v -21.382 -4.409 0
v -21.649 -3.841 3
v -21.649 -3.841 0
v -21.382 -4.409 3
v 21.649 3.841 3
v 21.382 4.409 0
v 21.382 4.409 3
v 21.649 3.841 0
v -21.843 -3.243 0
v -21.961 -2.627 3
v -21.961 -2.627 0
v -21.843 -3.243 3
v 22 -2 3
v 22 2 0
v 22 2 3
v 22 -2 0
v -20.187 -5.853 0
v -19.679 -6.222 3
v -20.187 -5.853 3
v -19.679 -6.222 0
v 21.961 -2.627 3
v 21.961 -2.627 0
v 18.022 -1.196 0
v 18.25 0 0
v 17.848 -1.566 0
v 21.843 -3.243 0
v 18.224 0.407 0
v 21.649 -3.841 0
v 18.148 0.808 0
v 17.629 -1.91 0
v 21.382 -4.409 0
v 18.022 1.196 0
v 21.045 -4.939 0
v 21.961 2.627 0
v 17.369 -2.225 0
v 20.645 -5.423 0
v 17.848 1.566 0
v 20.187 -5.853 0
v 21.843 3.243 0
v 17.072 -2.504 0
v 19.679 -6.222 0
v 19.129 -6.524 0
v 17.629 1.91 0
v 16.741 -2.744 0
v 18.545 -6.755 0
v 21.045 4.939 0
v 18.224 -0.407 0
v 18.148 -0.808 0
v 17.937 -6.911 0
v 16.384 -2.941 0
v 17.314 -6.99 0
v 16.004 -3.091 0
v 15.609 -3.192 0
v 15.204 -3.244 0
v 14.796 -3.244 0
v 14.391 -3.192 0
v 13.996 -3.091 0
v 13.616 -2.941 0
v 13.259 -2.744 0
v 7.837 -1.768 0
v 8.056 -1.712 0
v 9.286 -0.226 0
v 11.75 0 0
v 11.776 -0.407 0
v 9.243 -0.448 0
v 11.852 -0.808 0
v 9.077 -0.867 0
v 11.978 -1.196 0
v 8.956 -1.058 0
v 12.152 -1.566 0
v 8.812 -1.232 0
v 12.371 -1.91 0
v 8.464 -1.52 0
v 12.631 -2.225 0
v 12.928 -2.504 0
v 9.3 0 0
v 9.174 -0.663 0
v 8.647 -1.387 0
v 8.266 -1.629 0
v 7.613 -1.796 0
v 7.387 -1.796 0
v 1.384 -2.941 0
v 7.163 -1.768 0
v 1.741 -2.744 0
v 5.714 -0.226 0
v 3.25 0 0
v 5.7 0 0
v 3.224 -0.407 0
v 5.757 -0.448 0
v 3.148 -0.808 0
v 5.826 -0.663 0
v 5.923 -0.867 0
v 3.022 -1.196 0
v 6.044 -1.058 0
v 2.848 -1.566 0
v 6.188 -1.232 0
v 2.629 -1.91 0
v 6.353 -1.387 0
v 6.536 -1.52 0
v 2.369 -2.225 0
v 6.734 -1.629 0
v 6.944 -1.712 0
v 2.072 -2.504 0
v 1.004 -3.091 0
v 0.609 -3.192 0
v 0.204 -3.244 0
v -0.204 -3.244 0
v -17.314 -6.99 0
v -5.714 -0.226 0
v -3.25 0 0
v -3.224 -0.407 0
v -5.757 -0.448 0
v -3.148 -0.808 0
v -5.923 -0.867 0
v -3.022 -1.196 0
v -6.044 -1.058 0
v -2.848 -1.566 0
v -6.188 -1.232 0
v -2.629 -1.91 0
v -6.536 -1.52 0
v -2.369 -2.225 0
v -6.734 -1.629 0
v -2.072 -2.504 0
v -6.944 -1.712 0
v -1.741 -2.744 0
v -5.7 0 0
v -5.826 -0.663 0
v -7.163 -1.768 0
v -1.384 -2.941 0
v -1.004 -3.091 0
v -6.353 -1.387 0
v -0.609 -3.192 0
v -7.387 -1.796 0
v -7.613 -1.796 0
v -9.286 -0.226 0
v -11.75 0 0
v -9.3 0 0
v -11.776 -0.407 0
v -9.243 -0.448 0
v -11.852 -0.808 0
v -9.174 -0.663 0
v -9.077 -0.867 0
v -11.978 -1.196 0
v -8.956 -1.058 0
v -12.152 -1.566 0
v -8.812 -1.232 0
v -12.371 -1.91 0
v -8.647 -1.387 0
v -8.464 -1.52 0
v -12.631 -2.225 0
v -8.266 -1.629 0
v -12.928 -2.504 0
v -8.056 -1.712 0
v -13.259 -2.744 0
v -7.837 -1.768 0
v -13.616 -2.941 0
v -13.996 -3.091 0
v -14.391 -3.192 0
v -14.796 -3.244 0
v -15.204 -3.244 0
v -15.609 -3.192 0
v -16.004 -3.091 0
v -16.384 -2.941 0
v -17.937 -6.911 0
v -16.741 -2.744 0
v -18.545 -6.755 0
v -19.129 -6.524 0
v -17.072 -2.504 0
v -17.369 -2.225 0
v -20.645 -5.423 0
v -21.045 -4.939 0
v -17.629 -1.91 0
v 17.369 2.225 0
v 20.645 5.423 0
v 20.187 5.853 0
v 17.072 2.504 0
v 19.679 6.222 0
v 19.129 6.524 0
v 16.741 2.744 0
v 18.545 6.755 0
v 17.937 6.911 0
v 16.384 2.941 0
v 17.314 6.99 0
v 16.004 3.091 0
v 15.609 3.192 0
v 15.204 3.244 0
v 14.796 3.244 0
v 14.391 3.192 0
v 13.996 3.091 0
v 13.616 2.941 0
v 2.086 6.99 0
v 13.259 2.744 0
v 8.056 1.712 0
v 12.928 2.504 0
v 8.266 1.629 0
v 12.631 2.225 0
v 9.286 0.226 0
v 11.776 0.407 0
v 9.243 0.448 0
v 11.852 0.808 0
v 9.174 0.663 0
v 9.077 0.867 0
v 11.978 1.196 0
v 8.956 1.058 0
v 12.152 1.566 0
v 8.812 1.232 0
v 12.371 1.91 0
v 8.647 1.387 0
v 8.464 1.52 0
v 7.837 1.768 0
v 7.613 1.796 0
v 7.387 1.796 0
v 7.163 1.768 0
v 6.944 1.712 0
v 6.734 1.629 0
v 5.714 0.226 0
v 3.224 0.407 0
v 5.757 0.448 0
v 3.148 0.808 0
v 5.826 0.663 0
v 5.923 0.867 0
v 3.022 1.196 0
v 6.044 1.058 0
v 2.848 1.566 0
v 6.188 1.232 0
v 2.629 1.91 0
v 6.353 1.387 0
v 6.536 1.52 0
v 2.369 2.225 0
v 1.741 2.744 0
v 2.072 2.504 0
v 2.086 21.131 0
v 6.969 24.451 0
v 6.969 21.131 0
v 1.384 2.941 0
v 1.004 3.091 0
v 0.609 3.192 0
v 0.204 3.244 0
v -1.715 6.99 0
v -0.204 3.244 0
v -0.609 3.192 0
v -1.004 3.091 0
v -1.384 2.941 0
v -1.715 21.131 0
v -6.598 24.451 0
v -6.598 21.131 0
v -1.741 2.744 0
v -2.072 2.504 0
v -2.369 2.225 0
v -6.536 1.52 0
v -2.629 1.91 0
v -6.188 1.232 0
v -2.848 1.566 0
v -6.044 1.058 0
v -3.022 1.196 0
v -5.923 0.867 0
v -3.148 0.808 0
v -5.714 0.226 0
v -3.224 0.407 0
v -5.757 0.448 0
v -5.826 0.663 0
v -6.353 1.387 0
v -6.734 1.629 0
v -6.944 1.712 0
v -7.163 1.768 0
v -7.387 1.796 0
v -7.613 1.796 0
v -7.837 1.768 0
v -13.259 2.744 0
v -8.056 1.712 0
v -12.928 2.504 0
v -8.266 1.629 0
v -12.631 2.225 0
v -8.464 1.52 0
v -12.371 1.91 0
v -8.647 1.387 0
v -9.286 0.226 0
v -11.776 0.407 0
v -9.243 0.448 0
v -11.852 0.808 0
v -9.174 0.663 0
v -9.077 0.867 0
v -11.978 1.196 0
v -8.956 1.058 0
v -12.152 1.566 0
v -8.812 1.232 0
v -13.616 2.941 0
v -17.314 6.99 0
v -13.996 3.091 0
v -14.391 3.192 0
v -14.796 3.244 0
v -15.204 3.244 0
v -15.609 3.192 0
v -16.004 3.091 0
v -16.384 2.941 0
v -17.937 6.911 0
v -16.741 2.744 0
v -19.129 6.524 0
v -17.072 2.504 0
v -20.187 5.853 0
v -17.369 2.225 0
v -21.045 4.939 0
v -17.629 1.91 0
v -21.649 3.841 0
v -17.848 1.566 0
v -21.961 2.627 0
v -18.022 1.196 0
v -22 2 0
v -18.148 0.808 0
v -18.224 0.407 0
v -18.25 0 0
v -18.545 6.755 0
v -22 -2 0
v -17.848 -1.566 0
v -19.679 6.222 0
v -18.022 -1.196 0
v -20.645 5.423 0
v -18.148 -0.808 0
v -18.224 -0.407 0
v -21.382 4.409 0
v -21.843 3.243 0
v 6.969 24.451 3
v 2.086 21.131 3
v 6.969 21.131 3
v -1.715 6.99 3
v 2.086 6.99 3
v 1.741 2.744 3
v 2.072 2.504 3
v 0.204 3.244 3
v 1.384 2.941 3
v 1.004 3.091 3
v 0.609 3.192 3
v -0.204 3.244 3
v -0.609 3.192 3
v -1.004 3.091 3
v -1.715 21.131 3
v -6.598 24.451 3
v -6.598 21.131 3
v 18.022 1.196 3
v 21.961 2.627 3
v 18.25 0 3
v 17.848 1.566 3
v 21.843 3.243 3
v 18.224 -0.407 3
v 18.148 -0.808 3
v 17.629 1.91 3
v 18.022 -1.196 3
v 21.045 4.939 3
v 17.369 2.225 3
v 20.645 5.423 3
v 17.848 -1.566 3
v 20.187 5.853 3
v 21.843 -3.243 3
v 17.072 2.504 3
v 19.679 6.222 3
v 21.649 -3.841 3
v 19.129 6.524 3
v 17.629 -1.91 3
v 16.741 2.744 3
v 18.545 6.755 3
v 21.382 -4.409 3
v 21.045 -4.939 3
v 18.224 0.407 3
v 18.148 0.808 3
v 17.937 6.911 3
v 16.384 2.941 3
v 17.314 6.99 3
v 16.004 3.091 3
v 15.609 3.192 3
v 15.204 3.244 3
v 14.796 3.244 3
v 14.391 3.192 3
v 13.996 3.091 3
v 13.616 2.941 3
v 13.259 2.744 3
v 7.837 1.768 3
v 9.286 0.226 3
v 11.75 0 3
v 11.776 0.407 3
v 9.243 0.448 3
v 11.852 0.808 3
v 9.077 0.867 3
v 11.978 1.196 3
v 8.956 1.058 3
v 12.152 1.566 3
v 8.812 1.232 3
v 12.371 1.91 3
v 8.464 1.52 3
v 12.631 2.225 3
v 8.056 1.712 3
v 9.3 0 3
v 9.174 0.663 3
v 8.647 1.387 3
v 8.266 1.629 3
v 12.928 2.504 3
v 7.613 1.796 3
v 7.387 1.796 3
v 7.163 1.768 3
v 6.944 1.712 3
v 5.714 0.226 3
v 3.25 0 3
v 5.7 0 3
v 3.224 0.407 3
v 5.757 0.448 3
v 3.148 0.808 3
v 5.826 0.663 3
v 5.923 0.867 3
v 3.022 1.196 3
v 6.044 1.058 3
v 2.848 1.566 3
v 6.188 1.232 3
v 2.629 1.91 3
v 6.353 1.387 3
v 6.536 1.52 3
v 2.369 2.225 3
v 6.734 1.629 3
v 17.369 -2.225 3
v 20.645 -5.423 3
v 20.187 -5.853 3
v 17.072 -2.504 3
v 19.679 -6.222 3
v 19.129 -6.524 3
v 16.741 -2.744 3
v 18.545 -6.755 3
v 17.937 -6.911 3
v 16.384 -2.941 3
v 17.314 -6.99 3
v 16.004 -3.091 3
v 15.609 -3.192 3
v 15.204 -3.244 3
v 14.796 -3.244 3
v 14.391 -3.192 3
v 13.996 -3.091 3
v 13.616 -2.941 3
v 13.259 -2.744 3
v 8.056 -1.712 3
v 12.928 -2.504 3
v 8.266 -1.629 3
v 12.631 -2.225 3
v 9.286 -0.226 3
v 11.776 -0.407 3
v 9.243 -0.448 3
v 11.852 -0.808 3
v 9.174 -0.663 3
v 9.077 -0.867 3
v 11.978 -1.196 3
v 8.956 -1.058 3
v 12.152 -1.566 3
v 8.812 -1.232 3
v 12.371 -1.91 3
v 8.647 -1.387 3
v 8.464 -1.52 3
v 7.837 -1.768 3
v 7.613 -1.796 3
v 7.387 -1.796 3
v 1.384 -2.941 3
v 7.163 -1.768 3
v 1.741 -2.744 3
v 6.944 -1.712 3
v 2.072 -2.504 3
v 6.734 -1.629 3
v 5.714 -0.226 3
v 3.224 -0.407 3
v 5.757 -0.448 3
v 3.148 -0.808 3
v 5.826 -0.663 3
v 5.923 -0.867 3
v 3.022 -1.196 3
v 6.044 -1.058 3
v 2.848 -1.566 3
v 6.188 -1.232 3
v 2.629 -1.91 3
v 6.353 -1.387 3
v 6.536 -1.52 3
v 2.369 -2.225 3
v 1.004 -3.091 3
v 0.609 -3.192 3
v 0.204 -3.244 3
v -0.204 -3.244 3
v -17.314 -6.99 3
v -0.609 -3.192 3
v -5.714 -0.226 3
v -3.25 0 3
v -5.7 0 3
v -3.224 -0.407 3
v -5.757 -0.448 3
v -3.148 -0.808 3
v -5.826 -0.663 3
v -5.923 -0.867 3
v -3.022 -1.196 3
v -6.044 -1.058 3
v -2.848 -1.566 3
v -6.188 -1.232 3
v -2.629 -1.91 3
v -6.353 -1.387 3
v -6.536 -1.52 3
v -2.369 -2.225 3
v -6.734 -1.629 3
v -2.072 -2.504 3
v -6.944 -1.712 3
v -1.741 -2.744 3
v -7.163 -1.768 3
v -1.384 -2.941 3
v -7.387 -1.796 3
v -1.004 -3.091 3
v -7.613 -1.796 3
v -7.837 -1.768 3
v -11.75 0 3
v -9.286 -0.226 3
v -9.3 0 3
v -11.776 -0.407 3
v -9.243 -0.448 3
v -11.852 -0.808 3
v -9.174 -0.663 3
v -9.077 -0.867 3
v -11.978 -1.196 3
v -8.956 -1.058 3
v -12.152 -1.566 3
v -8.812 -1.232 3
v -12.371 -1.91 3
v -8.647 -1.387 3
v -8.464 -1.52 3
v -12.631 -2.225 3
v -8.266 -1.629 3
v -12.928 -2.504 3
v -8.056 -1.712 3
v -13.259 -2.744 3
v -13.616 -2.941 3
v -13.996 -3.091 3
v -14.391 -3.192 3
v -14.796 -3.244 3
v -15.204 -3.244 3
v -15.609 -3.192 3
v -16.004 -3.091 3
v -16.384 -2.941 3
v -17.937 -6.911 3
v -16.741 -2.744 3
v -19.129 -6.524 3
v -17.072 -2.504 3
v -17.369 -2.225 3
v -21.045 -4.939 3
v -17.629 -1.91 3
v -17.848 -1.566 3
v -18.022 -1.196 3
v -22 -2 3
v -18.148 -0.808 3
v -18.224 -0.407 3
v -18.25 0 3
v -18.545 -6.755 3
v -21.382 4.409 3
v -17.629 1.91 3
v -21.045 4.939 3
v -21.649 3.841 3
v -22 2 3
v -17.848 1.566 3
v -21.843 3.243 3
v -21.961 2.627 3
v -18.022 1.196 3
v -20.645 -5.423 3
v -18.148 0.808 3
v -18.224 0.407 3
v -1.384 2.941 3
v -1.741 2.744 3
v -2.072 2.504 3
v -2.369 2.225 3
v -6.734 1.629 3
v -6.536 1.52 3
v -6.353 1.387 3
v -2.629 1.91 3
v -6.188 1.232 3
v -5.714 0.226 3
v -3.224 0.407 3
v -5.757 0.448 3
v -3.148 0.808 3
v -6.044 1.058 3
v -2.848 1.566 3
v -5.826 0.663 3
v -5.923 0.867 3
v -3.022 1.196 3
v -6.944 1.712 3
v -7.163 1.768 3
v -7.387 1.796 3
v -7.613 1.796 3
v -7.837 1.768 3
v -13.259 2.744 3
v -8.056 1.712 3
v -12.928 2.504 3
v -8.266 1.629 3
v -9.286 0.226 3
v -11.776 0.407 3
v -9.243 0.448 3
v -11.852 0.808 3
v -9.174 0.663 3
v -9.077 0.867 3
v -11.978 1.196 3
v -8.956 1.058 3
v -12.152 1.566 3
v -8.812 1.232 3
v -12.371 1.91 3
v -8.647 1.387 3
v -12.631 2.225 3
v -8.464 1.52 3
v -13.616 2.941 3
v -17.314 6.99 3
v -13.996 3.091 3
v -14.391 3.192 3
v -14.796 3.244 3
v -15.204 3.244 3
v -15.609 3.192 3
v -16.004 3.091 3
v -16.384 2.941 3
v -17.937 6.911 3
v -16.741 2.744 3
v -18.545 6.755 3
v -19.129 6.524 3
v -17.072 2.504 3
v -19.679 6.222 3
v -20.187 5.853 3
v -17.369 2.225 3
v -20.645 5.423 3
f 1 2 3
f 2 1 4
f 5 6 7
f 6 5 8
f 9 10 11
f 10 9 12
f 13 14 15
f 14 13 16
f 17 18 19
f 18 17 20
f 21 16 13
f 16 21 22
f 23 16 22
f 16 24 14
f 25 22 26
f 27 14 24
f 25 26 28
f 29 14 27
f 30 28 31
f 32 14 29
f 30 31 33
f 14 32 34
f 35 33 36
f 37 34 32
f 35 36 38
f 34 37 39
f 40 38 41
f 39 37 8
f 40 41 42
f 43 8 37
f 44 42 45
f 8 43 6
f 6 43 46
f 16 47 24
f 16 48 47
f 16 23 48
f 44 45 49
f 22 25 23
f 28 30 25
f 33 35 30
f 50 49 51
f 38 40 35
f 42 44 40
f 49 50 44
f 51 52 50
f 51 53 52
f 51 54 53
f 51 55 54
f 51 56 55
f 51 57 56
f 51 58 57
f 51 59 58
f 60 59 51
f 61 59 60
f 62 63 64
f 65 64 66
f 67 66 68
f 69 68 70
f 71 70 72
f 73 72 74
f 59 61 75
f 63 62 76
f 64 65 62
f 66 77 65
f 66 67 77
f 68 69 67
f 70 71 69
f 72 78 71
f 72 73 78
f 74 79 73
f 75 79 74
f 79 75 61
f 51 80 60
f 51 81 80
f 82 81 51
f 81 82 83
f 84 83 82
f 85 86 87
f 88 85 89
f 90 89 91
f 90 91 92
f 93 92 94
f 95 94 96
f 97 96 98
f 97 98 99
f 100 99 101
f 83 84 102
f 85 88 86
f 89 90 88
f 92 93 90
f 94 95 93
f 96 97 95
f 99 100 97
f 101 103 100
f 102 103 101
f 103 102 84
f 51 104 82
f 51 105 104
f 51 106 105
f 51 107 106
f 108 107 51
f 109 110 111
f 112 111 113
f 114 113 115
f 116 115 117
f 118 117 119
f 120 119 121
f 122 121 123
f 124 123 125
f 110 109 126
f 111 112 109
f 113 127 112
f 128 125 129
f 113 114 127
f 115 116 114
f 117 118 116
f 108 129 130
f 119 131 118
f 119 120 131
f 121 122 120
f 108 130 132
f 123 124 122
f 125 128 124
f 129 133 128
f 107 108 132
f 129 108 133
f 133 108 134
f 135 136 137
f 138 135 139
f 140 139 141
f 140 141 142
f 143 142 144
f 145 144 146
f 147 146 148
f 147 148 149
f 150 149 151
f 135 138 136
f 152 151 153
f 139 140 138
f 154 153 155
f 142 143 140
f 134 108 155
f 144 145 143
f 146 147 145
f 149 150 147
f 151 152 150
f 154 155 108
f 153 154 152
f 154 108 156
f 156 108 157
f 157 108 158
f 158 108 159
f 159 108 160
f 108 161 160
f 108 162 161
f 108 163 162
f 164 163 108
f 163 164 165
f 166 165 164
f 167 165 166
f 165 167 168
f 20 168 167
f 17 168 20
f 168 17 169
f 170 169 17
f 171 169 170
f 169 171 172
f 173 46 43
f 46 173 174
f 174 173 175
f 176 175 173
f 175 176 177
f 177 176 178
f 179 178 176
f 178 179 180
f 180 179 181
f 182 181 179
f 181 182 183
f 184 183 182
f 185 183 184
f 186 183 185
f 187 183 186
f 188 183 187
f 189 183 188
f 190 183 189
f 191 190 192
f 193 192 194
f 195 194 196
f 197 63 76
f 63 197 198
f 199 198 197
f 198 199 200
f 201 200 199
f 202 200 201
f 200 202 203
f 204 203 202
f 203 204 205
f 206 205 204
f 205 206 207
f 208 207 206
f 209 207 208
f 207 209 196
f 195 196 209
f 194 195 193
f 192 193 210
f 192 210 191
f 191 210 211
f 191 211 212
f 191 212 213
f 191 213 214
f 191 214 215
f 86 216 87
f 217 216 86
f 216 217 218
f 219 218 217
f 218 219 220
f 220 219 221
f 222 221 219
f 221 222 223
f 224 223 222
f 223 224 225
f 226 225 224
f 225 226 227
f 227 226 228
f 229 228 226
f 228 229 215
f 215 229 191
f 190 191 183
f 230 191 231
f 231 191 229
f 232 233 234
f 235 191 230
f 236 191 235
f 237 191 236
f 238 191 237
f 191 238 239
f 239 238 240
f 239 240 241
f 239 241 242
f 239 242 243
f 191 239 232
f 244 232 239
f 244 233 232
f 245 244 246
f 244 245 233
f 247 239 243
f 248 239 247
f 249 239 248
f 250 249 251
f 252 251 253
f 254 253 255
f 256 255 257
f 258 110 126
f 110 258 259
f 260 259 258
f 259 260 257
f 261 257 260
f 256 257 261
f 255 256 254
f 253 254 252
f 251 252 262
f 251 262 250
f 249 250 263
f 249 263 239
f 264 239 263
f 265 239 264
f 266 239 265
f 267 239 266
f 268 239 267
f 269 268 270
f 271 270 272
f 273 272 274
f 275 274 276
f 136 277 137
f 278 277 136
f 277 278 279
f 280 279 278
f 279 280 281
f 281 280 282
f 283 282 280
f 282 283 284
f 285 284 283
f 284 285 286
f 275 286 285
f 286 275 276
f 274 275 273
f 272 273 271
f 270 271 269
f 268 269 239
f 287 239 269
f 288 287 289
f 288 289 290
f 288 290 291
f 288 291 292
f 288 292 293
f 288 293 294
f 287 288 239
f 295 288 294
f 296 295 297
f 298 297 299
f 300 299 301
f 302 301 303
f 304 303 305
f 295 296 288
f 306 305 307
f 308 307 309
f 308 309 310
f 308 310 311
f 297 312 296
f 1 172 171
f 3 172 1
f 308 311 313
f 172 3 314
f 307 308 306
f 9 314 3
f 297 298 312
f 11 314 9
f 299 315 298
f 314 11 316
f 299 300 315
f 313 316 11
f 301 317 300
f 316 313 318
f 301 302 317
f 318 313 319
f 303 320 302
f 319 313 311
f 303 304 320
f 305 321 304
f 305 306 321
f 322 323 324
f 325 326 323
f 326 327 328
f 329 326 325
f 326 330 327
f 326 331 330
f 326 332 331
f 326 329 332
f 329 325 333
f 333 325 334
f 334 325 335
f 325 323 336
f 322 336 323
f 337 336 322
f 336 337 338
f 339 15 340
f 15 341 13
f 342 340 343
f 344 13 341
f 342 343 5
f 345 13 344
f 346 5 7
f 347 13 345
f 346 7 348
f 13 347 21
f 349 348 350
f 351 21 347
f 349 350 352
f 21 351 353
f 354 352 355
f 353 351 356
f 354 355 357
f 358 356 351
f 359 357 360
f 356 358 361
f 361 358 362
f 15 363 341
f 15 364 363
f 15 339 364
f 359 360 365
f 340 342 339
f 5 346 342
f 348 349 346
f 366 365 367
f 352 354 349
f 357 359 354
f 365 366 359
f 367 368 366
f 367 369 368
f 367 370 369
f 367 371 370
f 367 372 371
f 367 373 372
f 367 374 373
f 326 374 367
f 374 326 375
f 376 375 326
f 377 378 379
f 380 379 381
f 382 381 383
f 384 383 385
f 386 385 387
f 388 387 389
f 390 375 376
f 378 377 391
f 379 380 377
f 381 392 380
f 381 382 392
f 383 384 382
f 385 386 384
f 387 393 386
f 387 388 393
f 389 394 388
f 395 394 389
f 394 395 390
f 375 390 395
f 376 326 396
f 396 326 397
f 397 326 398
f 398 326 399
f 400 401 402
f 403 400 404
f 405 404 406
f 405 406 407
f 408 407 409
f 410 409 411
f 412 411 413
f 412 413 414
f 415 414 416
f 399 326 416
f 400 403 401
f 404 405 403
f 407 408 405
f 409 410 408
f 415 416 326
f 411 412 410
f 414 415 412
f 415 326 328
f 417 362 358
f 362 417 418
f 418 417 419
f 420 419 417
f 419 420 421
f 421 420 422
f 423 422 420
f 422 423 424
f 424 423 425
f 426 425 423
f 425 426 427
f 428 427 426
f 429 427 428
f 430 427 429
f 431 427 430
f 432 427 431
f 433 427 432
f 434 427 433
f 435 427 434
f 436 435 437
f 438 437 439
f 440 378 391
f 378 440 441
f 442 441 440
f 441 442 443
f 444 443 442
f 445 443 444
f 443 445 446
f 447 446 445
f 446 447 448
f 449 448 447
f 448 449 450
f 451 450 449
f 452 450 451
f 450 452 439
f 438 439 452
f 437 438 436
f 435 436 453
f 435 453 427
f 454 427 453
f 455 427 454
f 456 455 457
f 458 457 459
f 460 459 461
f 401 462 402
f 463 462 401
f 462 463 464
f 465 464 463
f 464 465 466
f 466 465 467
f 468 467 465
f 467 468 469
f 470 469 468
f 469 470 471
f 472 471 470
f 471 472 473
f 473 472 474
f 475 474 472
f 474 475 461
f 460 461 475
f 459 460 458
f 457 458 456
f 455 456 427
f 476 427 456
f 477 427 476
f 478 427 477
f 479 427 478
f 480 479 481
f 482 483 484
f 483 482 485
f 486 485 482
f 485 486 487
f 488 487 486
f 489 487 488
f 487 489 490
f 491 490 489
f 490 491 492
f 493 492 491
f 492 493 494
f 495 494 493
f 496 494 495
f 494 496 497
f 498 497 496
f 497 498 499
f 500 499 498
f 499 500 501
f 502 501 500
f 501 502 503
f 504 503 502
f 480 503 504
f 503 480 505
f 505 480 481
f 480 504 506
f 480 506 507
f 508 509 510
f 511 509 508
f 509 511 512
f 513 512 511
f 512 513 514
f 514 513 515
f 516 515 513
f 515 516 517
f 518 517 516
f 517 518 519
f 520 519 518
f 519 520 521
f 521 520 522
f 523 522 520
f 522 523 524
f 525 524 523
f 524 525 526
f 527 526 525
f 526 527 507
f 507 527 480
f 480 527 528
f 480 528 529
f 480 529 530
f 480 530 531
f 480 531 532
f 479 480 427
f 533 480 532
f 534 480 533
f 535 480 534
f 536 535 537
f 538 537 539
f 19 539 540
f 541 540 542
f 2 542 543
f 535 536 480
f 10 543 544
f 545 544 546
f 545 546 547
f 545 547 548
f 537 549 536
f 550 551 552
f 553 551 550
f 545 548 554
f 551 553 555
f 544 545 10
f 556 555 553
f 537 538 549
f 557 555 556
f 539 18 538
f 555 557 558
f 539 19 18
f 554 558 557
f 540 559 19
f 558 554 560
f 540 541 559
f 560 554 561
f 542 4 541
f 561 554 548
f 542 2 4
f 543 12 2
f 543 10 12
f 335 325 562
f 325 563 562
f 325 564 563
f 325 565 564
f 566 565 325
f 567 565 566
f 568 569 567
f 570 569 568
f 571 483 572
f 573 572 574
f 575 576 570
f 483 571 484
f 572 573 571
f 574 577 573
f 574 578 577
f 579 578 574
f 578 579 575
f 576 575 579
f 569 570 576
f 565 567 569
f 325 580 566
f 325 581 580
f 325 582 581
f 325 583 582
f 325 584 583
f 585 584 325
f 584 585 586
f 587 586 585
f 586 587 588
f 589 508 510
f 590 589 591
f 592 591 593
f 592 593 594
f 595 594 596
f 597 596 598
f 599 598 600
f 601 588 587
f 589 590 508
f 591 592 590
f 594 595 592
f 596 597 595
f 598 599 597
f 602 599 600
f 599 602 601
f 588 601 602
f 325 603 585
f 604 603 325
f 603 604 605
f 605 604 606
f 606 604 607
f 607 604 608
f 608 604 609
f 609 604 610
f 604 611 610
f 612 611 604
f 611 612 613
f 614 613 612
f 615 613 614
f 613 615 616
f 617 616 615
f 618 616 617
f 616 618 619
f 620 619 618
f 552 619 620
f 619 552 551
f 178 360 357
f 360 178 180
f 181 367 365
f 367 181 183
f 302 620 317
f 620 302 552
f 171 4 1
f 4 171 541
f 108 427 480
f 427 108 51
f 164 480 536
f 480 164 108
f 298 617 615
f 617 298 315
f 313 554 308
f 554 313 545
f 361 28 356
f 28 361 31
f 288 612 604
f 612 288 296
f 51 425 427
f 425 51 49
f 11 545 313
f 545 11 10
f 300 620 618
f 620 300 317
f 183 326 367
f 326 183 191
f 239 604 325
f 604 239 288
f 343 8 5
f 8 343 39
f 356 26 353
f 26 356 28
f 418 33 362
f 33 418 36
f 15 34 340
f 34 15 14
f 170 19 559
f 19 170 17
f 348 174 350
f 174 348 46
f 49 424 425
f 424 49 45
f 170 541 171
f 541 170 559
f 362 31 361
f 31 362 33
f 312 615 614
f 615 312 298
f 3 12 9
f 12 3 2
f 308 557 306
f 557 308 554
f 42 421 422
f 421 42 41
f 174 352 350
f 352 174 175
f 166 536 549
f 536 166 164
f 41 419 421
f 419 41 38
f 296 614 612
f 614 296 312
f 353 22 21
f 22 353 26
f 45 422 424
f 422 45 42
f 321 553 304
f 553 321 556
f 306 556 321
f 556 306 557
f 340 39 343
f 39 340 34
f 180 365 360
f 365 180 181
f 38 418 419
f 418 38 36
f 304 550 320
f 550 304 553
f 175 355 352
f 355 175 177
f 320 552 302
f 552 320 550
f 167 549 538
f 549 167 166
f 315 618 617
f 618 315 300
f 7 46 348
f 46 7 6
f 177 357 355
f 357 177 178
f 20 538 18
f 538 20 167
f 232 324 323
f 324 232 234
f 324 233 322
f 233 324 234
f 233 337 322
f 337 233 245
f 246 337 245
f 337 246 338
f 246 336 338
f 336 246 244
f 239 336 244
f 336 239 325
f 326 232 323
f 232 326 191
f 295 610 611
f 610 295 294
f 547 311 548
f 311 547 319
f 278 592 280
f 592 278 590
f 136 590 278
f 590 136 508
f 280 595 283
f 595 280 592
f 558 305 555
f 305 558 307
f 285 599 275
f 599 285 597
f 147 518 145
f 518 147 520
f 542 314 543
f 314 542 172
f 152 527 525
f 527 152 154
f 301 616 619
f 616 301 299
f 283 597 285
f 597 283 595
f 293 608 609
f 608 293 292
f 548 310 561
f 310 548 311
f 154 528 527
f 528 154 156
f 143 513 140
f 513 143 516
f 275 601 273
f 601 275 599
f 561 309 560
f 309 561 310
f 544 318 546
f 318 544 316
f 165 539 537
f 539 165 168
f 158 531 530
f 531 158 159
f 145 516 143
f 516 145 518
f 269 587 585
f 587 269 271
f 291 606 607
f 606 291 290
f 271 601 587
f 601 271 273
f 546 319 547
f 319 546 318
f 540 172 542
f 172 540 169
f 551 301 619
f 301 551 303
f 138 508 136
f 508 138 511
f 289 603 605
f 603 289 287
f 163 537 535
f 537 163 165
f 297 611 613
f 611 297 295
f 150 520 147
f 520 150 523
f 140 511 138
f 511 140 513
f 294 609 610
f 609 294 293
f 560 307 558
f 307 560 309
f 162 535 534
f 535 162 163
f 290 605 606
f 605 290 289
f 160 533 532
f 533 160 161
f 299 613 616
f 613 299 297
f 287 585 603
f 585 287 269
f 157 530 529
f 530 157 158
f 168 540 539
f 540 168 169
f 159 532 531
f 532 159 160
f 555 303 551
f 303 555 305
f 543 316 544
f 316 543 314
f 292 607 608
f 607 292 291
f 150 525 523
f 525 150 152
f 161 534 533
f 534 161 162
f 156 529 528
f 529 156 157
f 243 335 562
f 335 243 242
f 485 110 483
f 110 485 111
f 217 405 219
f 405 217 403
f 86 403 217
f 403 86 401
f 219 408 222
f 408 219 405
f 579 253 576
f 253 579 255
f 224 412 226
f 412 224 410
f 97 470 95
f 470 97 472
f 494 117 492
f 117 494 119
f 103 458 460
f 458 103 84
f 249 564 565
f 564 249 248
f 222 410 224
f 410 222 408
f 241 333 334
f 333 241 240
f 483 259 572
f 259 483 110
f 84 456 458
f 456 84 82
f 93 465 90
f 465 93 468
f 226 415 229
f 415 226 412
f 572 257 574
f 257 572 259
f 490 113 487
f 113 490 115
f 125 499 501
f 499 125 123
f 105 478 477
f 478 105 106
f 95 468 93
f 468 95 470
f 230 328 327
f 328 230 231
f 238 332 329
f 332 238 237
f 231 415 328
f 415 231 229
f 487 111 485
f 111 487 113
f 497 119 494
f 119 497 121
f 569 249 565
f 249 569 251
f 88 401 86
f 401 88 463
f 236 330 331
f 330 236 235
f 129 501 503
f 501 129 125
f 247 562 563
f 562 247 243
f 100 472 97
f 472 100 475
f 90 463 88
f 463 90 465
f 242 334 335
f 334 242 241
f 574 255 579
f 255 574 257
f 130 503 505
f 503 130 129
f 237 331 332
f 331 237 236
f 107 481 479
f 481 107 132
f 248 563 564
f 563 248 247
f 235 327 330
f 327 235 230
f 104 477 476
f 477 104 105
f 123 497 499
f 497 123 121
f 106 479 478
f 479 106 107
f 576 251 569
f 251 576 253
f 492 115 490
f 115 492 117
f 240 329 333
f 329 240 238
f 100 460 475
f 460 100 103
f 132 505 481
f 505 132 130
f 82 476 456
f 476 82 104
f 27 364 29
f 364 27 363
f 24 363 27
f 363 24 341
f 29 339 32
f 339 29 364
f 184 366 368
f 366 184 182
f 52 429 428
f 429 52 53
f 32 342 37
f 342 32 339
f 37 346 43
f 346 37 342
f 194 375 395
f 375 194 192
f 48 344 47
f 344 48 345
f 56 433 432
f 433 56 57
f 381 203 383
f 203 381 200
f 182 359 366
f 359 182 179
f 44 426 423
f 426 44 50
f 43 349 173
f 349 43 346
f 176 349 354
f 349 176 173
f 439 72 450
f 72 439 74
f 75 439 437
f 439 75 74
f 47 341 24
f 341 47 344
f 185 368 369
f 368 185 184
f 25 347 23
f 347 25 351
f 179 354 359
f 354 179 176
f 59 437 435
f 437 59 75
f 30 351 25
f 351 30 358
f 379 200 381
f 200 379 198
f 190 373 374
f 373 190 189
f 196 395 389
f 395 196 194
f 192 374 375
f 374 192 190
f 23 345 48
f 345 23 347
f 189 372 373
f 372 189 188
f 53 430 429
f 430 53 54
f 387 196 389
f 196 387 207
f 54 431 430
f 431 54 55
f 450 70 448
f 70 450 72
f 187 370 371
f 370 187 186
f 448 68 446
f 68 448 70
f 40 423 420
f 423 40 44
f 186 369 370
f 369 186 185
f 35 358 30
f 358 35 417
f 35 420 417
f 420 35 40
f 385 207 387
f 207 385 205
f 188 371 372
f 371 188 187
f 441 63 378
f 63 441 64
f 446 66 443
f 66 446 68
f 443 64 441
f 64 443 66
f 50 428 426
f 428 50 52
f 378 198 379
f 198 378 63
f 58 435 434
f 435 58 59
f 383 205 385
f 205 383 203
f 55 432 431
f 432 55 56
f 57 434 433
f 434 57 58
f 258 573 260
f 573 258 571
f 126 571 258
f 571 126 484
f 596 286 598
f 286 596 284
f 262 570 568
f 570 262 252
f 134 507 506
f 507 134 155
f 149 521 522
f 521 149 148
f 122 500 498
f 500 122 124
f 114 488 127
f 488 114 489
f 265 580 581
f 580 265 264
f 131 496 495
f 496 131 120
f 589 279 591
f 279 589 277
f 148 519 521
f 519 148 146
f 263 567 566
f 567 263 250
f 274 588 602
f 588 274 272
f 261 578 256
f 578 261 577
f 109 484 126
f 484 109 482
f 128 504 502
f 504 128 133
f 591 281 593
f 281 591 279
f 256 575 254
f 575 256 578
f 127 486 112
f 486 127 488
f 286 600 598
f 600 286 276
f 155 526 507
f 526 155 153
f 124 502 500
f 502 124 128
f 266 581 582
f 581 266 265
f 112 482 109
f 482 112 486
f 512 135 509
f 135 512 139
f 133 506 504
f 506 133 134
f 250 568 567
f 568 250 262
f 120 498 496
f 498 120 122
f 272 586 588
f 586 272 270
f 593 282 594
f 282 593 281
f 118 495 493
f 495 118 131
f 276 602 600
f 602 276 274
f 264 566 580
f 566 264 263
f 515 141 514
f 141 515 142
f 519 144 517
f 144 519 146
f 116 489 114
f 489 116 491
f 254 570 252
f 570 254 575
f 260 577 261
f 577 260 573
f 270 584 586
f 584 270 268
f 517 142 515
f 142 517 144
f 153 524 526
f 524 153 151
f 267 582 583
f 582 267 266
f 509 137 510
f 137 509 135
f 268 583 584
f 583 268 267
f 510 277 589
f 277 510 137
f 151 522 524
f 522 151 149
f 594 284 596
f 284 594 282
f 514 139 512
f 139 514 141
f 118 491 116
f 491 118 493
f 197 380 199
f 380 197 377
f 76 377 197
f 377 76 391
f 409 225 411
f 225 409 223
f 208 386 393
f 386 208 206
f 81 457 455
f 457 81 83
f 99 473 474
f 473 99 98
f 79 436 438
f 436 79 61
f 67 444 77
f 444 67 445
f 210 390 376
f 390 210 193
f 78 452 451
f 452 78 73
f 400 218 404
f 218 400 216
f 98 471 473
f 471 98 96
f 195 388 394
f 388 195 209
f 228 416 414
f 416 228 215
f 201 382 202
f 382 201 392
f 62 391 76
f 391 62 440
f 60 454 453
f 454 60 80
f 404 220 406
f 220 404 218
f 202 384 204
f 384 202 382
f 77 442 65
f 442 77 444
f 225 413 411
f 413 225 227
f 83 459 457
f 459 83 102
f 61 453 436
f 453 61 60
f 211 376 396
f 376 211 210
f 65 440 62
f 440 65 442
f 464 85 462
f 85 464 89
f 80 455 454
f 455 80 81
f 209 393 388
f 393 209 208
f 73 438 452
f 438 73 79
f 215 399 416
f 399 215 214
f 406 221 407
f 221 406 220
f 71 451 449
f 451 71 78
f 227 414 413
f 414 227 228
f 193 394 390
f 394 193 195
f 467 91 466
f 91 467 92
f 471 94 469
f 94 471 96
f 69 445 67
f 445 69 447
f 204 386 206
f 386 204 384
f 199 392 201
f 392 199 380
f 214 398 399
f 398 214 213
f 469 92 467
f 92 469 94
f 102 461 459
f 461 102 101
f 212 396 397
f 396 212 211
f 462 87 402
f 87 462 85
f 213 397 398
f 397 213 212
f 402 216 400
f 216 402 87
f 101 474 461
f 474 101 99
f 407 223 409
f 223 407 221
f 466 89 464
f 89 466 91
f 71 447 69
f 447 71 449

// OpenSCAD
$fn = 50;


difference() {
	union() {
		hull() {
			translate(v = [-17.0000000000, 2.0000000000, 0]) {
				cylinder(h = 3, r = 5);
			}
			translate(v = [17.0000000000, 2.0000000000, 0]) {
				cylinder(h = 3, r = 5);
			}
			translate(v = [-17.0000000000, -2.0000000000, 0]) {
				cylinder(h = 3, r = 5);
			}
			translate(v = [17.0000000000, -2.0000000000, 0]) {
				cylinder(h = 3, r = 5);
			}
		}
		translate(v = [0, 24, 0]) {
			linear_extrude(height = 3) {
				text(font = "DejaVu Sans Mono:style=Bold", halign = "center", size = 19.0000000000, text = "T", valign = "top");
			}
		}
	}
	union() {
		translate(v = [-15.0000000000, 0.0000000000, 0]) {
			translate(v = [0, 0, -100]) {
				cylinder(h = 200, r = 3.2500000000);
			}
		}
		translate(v = [0, 0, -100]) {
			cylinder(h = 200, r = 3.2500000000);
		}
		translate(v = [15.0000000000, 0.0000000000, 0]) {
			translate(v = [0, 0, -100]) {
				cylinder(h = 200, r = 3.2500000000);
			}
		}
		translate(v = [-15.0000000000, 0.0000000000, 0]) {
			translate(v = [0, 0, -100]) {
				cylinder(h = 200, r = 1.8000000000);
			}
		}
		translate(v = [-7.5000000000, 0.0000000000, 0]) {
			translate(v = [0, 0, -100]) {
				cylinder(h = 200, r = 1.8000000000);
			}
		}
		translate(v = [0, 0, -100]) {
			cylinder(h = 200, r = 1.8000000000);
		}
		translate(v = [7.5000000000, 0.0000000000, 0]) {
			translate(v = [0, 0, -100]) {
				cylinder(h = 200, r = 1.8000000000);
			}
		}
		translate(v = [15.0000000000, 0.0000000000, 0]) {
			translate(v = [0, 0, -100]) {
				cylinder(h = 200, r = 1.8000000000);
			}
		}
	}
}
